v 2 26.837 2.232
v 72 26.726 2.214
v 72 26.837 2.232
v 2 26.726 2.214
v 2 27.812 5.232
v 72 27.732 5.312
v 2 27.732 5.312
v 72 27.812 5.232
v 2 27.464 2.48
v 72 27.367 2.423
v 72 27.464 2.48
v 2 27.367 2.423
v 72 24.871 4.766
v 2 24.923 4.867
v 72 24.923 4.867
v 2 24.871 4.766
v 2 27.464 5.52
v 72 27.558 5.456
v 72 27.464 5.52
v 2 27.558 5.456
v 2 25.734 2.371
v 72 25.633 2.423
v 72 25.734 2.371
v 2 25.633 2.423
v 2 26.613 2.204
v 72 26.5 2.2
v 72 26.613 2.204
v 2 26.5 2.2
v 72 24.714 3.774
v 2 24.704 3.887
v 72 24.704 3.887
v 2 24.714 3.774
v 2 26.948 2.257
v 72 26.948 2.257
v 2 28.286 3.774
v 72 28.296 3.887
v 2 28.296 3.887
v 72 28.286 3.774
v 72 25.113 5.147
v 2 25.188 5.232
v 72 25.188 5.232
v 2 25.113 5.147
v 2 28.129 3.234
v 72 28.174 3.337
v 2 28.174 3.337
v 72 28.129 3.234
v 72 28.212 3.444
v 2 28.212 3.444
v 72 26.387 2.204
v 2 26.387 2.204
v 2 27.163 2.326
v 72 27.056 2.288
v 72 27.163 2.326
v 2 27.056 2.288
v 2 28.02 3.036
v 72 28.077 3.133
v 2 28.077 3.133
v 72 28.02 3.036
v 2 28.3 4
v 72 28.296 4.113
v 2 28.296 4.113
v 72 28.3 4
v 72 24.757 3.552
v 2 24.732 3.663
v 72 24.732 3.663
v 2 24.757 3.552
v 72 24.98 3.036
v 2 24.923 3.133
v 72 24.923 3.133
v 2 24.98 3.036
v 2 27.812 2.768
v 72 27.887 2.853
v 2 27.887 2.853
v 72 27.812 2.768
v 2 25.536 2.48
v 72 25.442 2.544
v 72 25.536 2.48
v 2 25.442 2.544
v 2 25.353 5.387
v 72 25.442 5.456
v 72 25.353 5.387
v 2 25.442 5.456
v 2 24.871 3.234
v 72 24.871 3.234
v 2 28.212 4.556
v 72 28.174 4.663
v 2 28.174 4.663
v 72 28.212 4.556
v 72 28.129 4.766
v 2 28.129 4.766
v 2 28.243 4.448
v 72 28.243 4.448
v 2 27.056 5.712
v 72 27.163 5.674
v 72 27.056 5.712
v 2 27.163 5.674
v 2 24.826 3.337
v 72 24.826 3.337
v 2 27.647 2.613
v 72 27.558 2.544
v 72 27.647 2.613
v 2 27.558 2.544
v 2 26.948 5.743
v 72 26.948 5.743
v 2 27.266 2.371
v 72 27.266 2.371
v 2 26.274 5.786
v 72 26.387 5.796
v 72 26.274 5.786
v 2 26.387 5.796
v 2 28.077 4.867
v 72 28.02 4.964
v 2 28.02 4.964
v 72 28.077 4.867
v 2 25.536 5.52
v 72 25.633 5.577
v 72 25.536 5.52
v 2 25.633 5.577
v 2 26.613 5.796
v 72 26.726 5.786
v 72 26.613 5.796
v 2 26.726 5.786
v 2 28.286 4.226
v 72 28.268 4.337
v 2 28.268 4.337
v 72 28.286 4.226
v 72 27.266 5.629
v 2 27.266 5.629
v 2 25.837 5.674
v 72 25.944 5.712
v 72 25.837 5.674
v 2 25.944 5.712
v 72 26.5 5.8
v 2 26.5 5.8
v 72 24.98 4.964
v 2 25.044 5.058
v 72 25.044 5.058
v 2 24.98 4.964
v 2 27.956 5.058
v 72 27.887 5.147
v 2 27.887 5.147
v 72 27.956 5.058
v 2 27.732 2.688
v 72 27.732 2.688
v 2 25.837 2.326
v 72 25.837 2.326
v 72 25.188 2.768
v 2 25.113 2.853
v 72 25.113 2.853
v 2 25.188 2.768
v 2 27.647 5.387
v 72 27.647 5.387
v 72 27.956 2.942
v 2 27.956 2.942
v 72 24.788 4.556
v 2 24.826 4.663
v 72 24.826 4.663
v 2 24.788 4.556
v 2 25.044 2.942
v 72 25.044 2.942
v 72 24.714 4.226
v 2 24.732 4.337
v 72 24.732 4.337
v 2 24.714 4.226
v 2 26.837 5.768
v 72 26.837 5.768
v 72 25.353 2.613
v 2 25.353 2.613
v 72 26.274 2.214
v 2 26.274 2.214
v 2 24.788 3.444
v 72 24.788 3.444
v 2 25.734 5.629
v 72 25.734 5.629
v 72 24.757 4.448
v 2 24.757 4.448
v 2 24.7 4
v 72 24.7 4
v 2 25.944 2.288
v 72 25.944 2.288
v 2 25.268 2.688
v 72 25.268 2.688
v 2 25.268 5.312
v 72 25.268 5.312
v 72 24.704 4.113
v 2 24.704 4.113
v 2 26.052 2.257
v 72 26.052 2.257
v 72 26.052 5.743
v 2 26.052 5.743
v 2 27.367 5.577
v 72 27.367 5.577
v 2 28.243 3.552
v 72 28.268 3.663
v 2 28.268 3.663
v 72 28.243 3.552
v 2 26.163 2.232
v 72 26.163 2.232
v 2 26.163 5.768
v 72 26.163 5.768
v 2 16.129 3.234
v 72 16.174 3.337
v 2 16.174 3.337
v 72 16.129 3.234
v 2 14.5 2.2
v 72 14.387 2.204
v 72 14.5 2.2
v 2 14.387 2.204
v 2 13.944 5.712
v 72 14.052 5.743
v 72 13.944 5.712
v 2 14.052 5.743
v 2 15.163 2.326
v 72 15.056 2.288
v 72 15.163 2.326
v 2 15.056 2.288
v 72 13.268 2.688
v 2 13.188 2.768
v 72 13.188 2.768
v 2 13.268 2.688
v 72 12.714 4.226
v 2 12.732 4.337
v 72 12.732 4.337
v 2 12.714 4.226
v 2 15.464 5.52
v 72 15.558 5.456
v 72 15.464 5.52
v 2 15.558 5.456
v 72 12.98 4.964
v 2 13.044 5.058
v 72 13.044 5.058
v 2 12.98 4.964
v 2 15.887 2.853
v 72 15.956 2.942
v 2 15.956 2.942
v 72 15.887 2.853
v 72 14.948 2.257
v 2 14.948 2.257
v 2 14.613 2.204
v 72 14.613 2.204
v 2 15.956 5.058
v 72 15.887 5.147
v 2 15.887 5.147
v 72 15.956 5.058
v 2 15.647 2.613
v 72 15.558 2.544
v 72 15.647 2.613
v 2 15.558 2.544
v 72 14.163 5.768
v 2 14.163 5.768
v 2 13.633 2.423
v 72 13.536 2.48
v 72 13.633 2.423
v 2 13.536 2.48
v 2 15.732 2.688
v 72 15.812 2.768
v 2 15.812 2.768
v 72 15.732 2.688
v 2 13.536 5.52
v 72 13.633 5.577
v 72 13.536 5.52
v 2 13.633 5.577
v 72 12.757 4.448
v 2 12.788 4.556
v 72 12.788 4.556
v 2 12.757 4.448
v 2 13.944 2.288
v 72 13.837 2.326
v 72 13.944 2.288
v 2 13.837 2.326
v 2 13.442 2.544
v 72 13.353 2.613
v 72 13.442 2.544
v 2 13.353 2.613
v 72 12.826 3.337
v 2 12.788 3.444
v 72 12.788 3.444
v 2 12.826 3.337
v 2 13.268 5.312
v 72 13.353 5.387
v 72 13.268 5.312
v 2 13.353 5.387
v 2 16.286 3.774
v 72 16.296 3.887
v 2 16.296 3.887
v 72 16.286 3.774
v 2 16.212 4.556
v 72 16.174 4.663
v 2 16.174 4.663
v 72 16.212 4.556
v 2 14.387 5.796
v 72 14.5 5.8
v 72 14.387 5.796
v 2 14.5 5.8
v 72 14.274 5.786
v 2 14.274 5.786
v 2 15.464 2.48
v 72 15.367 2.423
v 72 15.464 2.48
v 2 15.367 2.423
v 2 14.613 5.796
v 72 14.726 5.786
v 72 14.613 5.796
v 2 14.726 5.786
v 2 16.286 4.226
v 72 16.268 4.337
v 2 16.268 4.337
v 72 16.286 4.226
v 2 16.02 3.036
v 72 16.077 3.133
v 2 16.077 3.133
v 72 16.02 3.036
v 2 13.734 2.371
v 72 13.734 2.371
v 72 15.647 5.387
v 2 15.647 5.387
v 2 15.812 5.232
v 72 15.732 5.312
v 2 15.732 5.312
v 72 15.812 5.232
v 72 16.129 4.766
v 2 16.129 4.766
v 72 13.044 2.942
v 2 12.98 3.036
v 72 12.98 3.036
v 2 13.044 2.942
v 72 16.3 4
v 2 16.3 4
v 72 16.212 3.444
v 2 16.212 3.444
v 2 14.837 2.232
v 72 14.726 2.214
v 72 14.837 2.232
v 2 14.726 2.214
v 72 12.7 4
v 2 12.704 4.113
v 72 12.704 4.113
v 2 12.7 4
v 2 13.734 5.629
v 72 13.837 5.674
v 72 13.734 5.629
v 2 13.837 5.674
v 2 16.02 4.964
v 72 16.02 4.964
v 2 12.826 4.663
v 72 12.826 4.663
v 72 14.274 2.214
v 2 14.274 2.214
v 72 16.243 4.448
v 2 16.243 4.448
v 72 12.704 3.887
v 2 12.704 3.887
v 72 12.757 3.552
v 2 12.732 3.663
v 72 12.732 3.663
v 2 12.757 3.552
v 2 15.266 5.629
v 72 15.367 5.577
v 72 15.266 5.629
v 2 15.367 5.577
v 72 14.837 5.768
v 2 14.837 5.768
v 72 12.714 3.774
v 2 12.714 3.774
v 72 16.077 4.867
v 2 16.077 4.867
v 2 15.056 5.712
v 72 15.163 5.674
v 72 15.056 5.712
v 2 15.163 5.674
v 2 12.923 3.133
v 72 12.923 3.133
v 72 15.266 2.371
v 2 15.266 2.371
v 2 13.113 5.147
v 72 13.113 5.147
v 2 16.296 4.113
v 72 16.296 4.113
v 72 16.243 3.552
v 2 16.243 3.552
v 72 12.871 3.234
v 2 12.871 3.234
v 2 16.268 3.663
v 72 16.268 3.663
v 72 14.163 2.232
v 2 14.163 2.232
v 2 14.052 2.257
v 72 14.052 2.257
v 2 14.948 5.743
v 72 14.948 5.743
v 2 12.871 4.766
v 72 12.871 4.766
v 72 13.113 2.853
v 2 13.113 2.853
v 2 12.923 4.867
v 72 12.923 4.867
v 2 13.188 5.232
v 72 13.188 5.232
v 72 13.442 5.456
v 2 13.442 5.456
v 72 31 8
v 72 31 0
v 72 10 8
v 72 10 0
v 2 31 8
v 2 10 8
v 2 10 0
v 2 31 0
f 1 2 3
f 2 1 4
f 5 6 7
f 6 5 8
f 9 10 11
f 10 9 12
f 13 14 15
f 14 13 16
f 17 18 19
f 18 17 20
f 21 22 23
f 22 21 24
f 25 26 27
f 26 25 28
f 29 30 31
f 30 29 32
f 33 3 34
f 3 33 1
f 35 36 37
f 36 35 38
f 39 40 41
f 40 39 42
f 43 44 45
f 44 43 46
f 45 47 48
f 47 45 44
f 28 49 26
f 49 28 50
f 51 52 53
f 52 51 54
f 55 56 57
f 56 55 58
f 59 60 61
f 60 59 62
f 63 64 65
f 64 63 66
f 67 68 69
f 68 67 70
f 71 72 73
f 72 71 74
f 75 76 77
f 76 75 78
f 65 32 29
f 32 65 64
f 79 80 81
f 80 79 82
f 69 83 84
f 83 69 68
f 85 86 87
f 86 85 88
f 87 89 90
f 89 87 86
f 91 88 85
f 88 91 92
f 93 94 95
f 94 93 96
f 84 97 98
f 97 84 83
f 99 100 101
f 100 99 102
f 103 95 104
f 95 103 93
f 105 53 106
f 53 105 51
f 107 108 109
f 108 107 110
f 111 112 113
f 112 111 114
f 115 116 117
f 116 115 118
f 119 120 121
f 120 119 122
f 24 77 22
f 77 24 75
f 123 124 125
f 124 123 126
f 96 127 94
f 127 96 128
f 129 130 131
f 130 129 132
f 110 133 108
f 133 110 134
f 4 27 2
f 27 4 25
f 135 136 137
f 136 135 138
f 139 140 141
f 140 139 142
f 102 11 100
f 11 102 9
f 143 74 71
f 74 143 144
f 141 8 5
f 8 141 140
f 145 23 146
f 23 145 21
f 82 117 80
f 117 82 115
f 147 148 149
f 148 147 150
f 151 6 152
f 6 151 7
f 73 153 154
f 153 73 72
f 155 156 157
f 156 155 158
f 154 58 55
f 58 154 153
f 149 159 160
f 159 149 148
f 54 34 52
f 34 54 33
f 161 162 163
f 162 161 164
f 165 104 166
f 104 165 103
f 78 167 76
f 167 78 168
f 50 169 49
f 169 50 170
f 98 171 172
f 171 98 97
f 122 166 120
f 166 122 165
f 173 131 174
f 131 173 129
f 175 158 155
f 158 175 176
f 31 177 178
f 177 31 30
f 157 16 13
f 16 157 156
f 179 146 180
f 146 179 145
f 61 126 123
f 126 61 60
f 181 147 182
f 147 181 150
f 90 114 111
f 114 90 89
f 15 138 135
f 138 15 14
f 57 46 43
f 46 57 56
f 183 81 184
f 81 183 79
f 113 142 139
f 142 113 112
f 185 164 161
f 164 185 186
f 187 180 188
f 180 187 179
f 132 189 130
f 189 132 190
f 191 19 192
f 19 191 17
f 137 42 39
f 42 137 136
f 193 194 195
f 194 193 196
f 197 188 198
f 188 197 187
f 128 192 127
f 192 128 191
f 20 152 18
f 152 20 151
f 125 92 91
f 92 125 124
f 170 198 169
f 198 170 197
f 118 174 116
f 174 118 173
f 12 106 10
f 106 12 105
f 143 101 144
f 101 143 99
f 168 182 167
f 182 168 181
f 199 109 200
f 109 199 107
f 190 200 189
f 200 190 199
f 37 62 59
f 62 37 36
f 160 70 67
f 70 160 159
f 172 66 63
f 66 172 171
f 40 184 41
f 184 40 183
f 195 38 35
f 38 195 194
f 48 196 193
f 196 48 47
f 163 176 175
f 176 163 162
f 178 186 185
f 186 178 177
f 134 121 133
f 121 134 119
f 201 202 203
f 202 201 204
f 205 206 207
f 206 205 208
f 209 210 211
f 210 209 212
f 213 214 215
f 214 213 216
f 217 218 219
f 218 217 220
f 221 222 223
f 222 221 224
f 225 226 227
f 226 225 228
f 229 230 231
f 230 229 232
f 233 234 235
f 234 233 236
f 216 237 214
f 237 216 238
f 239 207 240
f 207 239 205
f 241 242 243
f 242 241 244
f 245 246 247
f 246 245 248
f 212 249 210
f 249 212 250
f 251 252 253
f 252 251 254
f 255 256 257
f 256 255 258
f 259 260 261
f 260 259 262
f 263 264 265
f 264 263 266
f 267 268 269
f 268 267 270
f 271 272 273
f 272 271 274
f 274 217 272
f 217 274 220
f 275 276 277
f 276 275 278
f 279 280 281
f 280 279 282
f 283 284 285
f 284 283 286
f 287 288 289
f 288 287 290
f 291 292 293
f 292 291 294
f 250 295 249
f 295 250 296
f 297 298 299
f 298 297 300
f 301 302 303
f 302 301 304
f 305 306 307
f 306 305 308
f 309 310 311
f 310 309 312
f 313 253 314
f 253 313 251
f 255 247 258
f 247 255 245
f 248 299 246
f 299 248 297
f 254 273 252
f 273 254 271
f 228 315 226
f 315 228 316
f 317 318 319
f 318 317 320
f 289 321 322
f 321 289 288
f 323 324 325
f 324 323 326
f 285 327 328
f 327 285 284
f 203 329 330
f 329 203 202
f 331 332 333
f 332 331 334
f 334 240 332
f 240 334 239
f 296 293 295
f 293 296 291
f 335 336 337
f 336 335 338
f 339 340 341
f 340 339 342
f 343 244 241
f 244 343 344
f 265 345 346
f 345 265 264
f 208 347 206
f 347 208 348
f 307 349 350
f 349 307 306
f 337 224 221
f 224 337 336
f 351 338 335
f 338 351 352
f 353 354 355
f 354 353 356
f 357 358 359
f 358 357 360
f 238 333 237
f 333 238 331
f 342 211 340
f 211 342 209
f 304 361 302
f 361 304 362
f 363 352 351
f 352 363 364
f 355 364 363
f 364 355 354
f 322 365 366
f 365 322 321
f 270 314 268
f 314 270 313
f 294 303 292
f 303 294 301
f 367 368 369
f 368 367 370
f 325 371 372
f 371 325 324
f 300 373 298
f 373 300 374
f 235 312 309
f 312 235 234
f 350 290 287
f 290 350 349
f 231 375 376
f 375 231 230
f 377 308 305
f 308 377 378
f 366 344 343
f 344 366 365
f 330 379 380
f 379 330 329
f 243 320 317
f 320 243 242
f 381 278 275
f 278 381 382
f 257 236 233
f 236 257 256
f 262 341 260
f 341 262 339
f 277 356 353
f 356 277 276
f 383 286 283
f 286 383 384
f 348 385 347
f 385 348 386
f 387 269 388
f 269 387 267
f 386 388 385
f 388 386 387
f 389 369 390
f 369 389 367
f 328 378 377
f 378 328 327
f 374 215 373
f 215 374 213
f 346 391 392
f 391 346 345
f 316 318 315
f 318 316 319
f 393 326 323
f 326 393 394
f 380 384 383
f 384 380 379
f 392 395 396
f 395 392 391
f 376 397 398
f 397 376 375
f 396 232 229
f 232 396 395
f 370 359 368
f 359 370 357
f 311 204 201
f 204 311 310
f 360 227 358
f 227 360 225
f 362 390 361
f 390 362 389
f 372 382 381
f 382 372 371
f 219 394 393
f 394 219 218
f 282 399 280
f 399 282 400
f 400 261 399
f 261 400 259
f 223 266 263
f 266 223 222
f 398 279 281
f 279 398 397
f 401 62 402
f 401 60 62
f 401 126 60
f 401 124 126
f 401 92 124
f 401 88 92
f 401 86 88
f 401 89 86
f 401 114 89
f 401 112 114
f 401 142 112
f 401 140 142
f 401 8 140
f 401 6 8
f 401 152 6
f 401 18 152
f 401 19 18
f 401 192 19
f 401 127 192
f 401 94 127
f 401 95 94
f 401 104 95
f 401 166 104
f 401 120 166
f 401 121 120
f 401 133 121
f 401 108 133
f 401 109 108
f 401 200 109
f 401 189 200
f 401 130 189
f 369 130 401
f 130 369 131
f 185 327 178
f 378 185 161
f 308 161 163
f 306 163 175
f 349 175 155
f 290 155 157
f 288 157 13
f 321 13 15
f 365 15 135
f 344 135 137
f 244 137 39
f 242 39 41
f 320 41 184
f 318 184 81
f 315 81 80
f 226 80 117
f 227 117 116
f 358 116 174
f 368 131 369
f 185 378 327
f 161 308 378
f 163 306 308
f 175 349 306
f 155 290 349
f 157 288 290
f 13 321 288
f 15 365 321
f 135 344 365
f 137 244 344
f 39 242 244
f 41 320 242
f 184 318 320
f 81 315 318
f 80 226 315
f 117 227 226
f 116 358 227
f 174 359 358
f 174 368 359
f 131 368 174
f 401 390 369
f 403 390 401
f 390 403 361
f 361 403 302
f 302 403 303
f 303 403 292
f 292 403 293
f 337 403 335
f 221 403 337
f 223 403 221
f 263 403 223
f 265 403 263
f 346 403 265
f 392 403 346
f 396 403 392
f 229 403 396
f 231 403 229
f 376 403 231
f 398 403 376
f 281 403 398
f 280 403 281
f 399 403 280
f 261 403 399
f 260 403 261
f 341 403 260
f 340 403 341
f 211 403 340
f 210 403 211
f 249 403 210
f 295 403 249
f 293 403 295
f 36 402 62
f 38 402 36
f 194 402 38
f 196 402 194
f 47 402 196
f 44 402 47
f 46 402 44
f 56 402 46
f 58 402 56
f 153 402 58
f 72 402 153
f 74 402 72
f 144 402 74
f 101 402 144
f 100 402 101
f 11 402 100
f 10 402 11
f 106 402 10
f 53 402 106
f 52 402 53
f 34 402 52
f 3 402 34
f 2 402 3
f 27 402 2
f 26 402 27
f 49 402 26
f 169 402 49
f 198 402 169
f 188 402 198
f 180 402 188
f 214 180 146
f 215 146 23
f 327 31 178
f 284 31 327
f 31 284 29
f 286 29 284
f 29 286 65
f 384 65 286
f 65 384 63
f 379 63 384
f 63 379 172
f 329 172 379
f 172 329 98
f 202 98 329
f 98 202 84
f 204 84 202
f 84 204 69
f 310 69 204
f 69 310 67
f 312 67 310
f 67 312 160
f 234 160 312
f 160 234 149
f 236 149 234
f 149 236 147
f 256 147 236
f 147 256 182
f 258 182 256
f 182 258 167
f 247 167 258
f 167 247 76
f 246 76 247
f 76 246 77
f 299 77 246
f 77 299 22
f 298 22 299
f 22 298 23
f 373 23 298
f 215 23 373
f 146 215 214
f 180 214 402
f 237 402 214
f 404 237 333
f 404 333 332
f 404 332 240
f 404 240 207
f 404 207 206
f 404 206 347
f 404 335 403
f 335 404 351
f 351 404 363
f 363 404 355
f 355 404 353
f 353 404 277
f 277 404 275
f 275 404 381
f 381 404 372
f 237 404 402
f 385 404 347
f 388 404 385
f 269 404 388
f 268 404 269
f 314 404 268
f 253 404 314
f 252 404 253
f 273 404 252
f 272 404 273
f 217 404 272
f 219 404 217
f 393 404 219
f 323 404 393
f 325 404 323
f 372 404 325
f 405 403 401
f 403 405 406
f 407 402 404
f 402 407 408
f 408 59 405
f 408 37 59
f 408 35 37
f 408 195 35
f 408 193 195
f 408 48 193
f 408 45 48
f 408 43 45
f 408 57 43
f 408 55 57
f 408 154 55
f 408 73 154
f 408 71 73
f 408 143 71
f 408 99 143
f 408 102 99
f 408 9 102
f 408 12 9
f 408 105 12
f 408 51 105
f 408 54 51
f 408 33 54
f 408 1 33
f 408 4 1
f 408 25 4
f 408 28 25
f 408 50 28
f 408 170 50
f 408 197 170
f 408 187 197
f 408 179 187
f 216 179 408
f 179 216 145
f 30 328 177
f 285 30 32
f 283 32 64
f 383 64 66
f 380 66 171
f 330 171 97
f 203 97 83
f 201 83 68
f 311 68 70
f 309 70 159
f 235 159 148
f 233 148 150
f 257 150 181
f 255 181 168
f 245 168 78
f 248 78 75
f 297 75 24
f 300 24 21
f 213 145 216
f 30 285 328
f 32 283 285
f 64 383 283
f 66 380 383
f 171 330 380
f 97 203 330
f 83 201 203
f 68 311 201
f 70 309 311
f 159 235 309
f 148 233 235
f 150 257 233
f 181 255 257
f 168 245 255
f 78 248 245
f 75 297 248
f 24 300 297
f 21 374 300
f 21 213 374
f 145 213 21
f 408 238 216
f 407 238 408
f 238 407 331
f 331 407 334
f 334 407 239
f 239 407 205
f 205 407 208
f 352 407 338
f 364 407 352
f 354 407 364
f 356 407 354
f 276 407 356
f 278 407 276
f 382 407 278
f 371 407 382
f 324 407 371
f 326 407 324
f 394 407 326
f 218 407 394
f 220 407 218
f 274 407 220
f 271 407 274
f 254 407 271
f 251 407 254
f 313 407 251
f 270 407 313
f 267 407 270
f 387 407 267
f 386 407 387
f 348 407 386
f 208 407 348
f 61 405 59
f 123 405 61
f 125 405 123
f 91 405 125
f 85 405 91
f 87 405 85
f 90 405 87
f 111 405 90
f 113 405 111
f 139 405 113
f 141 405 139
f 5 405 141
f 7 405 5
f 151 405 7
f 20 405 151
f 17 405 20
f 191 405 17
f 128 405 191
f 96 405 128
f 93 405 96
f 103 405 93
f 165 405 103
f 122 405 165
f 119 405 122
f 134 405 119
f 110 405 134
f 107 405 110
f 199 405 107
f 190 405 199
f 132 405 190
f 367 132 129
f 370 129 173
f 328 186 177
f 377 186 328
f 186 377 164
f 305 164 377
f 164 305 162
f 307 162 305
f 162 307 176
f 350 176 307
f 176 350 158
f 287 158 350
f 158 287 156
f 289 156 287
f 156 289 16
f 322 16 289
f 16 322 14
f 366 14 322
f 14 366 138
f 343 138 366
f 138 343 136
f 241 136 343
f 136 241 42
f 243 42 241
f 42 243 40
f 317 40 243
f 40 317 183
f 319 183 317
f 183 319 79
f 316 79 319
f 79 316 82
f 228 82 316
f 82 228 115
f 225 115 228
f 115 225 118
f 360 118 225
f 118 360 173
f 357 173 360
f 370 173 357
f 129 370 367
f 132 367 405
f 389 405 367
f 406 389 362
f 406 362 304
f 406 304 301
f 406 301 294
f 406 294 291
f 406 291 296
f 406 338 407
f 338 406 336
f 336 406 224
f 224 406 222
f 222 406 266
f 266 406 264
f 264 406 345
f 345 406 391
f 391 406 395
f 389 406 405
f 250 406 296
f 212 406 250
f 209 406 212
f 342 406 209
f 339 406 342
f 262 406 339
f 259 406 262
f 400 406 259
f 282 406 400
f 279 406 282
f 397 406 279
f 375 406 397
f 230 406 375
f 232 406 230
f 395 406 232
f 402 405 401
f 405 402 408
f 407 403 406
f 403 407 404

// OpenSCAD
difference(){
	union(){
        
       translate([2,10,0]){
           cube([70,21,8], center=false);
       }

       
	
	}
	union() {

       
       


       translate([-10,41/2+6,4]){
            rotate(a = [0,90,0]) {
              cylinder(h=600, r=1.8, $fn=100, center=false);
            }
       }	
       translate([-10,41/2-6,4]){
            rotate(a = [0,90,0]) {
              cylinder(h=600, r=1.8, $fn=100, center=false);
            }
       }	
       
       
	}
}
